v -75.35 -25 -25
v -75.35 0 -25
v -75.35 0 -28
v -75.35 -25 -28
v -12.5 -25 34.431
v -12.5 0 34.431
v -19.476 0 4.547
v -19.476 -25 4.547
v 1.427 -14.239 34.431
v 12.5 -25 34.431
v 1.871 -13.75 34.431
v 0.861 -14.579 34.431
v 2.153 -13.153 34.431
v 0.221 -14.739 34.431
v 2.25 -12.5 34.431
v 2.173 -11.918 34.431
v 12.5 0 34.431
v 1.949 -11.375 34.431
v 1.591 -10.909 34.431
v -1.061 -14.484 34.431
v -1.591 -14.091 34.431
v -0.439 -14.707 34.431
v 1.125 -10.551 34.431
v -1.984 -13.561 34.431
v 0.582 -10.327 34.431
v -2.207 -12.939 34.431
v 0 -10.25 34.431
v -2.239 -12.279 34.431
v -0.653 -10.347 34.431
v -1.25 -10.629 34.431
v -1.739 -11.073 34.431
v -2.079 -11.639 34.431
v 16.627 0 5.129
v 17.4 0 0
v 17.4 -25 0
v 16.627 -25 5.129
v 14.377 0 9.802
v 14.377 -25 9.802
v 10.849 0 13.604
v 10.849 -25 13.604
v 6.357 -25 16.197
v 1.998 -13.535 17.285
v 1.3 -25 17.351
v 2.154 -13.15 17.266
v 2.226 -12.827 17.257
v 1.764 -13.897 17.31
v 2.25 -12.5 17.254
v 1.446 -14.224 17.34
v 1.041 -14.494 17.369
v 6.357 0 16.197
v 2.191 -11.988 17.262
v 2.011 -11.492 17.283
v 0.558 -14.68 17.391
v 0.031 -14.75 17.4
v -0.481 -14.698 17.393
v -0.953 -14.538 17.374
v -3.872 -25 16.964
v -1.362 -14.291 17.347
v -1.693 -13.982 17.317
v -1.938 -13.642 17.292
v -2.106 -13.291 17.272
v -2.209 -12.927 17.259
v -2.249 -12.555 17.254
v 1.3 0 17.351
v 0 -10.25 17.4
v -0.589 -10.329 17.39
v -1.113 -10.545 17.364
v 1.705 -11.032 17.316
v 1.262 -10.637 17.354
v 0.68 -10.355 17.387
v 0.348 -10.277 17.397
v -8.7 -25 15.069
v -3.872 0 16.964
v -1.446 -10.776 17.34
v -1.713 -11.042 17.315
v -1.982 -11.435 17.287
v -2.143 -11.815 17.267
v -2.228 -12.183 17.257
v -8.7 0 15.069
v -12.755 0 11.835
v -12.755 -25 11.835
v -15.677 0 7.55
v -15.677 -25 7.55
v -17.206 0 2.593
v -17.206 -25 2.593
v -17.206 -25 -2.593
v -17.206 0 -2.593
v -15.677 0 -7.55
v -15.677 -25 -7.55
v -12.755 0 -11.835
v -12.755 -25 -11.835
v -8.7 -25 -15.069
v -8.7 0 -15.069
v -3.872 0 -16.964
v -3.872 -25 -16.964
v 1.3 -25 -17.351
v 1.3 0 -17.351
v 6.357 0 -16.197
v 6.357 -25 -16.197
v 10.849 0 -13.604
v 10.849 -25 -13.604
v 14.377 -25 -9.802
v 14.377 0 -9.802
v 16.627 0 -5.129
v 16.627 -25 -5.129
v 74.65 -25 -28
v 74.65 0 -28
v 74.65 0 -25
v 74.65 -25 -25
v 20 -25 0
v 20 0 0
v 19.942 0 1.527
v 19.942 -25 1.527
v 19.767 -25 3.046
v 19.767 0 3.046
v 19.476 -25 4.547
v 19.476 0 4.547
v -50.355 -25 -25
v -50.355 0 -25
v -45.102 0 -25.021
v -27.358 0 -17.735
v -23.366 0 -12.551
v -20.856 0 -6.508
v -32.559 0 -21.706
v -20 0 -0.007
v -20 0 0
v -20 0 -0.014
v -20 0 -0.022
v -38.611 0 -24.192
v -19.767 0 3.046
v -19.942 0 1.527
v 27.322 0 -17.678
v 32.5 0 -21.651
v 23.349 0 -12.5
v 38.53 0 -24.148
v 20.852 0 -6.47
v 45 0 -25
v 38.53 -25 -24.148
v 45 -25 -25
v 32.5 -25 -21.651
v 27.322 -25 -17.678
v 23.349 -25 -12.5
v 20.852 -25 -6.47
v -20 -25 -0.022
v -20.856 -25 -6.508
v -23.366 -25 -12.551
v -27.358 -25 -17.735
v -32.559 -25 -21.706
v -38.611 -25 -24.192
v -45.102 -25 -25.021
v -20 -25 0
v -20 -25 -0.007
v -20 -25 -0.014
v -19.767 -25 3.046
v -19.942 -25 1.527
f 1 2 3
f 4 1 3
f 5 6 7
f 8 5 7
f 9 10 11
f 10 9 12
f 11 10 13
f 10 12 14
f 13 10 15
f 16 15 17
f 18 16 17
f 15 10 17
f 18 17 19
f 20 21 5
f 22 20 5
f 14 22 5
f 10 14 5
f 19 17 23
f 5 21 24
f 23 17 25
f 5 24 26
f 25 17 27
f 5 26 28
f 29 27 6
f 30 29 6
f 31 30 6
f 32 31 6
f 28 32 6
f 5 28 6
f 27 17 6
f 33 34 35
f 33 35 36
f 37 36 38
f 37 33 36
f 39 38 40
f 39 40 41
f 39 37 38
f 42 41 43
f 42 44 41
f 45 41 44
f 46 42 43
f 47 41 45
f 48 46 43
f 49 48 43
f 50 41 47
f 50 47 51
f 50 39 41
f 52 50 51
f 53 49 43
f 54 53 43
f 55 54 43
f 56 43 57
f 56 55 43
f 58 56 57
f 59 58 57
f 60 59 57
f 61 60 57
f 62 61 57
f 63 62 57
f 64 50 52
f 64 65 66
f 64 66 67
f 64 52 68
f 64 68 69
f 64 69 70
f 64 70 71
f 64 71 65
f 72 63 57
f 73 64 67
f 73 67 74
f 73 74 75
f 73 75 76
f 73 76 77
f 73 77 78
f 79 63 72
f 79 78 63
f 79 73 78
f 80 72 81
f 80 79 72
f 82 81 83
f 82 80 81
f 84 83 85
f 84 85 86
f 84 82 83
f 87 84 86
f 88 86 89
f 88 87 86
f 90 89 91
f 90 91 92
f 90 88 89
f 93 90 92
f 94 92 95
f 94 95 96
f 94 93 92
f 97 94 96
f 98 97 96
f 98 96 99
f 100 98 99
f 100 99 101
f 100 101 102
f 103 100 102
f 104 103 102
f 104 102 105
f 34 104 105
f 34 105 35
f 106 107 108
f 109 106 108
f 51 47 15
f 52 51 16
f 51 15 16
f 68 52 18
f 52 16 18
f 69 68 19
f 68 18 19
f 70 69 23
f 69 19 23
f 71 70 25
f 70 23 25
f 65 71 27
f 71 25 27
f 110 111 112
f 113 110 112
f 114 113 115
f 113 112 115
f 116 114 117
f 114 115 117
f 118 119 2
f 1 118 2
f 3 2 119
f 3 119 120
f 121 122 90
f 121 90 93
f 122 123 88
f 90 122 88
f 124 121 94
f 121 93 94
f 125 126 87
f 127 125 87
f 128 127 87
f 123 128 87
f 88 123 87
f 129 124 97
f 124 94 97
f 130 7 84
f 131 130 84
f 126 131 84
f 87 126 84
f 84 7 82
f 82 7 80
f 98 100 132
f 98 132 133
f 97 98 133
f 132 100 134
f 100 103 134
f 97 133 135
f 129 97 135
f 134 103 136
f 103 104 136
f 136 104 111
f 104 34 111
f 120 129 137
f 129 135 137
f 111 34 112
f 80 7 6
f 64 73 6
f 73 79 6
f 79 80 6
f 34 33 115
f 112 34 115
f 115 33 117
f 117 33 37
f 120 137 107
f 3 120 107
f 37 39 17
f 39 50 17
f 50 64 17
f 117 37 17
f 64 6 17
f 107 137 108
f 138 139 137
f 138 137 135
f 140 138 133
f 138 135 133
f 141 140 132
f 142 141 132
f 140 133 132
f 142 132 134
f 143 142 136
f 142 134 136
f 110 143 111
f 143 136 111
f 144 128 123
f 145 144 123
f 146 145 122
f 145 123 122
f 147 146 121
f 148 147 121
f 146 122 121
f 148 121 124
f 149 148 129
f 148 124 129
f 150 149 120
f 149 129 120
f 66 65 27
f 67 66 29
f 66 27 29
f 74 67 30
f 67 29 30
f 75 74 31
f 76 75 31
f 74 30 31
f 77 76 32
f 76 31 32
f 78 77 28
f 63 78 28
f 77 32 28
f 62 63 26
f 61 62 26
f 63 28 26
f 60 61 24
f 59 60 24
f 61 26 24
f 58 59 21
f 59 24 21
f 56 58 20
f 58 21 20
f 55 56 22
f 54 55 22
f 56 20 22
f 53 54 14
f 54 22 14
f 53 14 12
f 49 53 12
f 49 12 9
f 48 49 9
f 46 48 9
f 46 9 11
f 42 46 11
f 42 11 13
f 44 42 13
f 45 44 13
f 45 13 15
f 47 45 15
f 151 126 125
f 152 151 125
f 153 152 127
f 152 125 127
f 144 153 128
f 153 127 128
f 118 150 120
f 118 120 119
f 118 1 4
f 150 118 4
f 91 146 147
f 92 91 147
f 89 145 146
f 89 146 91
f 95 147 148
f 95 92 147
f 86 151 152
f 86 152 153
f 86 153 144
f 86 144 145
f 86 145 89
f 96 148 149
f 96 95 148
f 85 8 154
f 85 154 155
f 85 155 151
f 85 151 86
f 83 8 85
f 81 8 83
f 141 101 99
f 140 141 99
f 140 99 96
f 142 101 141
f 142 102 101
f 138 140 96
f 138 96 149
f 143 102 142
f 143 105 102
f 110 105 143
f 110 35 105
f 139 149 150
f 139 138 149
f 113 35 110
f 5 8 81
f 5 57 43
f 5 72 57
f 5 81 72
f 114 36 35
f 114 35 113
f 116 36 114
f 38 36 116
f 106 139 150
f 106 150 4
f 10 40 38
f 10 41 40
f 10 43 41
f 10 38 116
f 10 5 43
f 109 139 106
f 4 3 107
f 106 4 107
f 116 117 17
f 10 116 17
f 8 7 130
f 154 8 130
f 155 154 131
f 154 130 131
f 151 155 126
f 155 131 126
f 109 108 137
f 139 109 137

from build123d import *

# Parameters (mm, degrees)
F0_R     = 17.4
F1_DEPTH = 25
F3_DEPTH = 50


# Not quite as in the source:
# - ends of sketch curves that miss each other by under 0.0002 mm in the source are joined


with BuildPart() as f1:
    # F0 (on Front) → F1 (new body)
    with BuildSketch(Plane.XZ):
        with BuildLine():
            ThreePointArc((-19.4763321764, 4.5467004469), (0, 20), (19.4763321764, 4.5467004469))
            Line((19.4763321764, 4.5467004469), (12.5, 34.4306491315))
            Line((12.5, 34.4306491315), (0, 34.4306491315))
            Line((0, 34.4306491315), (-12.5, 34.4306491315))
            Line((-12.5, 34.4306491315), (-19.4763321764, 4.5467004469))
        make_face()
        with BuildLine():
            ThreePointArc((-19.9999883661, -0.0215721294), (0.0107860663, -19.9999970915), (20, 0))
            ThreePointArc((20, 0), (19.8686517349, 2.2883789537), (19.4763321764, 4.5467004469))
            ThreePointArc((19.4763321764, 4.5467004469), (0, 20), (-19.4763321764, 4.5467004469))
            ThreePointArc((-19.4763321764, 4.5467004469), (-19.8686517349, 2.2883789537), (-20, 0))
            ThreePointArc((-20, 0), (-19.9999970915, -0.0107860663), (-19.9999883661, -0.0215721294))
        make_face()
        Circle(F0_R, mode=Mode.SUBTRACT)
        with BuildLine():
            ThreePointArc((45, -25), (27.3223304703, -17.6776695297), (20, 0))
            ThreePointArc((20, 0), (0.0107860663, -19.9999970915), (-19.9999883661, -0.0215721294))
            ThreePointArc((-19.9999883661, -0.0215721294), (-27.3583172251, -17.7351553161), (-45.1016823096, -25.0213653552))
            Line((-45.1016823096, -25.0213653552), (-50.3546064898, -25))
            Line((-50.3546064898, -25), (-75.3500018494, -25))
            Line((-75.3500018494, -25), (-75.3500018494, -28))
            Line((-75.3500018494, -28), (74.6500011308, -28))
            Line((74.6500011308, -28), (74.65, -25))
            Line((74.65, -25), (50.3546064898, -25))
            Line((50.3546064898, -25), (45, -25))
        make_face()
    extrude(amount=F1_DEPTH)

    # F2 (on face) → F3 (cut)
    with BuildSketch(Plane.XY.offset(34.4306491315)):
        with BuildLine():
            ThreePointArc((2.25, -12.5), (1.5909902577, -10.9090097423), (0, -10.25))
            ThreePointArc((0, -10.25), (-1.5909902577, -14.0909902577), (2.25, -12.5))
        make_face()
    extrude(amount=-F3_DEPTH, mode=Mode.SUBTRACT)


solid = f1.part
